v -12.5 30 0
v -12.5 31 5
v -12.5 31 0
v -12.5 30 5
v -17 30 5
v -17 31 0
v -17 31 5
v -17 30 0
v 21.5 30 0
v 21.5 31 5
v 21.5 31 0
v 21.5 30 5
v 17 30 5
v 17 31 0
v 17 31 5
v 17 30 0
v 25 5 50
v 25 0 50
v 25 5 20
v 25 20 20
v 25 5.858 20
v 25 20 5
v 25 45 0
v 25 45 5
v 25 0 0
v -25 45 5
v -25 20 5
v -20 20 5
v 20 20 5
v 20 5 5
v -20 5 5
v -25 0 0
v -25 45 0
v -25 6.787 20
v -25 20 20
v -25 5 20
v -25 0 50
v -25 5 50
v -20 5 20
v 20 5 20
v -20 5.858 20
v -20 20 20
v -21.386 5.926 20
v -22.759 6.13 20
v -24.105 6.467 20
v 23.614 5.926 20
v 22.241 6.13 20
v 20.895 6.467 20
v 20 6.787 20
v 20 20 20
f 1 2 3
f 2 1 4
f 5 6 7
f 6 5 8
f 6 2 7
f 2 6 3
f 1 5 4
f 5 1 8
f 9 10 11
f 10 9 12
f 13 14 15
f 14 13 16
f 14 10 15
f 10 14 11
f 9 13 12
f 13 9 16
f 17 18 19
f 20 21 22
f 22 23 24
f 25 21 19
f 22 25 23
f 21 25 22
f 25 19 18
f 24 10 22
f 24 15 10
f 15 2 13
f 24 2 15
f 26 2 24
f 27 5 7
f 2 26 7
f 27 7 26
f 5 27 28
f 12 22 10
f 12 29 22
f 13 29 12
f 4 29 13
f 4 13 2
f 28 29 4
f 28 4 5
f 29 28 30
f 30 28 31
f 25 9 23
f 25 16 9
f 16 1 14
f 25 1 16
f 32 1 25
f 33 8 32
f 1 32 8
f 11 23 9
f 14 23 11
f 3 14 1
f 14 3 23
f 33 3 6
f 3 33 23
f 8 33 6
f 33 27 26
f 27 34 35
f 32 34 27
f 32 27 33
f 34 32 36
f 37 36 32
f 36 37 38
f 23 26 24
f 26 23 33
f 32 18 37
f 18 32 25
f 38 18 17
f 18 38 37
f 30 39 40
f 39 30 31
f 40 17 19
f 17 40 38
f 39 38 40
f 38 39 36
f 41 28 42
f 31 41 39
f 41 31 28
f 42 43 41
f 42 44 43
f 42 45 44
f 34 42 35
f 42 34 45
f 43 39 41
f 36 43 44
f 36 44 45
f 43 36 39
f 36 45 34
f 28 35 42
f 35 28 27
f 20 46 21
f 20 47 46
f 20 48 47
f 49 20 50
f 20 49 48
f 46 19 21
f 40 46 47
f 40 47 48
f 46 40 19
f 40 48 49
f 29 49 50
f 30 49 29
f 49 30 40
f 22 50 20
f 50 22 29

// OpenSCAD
// L-shaped mounting bracket for NEMA 17 stepper motor (syringe pump)
// Print orientation: base plate on bed, vertical motor plate builds up +Z

// ---------------- Parameters ----------------
base_x0      = -25;   // base plate x start
base_x1      = 25;    // base plate x end
base_y0      = 0;     // base plate y start
base_y1      = 45;    // base plate y end
base_z       = 5;     // base plate thickness

motor_x0     = -25;   // motor plate x start
motor_x1     = 25;    // motor plate x end
motor_y      = 5;     // motor plate thickness (y end)
motor_z      = 50;    // motor plate height (z end)

boss_d       = 23;    // motor centring boss hole diameter
boss_x       = 0;     // boss hole centre x
boss_z       = 28;    // boss hole centre z

screw_d      = 3.4;   // M3 screw hole diameter
screw_n      = 4;     // number of screw holes
screw_pitch  = 31;    // square pattern side length

gusset_t     = 5;     // gusset thickness (x direction)
gusset_leg   = 20;    // right triangle legs along +Y and +Z
gusset_x0    = -25;   // left gusset x start
gusset_x1    = -20;   // left gusset x end
gusset_x2    = 20;    // right gusset x start
gusset_x3    = 25;    // right gusset x end

eps          = 0.5;   // cutter overshoot past faces

$fn = 96;

// ---------------- Model ----------------
union() {
    // Base plate with two vertical through-holes (M4)
    difference() {
        translate([base_x0, base_y0, 0])
            cube([base_x1 - base_x0, base_y1 - base_y0, base_z]);
        for (sx = [-17, 17])
            translate([sx, base_y1 - 15, -eps])
                cube([4.5, 1, base_z + 2 * eps]);
    }

    // Vertical motor plate standing on back edge of base
    difference() {
        translate([motor_x0, 0, 0])
            cube([motor_x1 - motor_x0, motor_y, motor_z]);
        // Boss hole along Y, centred at x = 0, z = 28
        translate([boss_x, -eps, boss_z])
            rotate([90, 0, 0])
                cylinder(d = boss_d, h = motor_y + 2 * eps);
        // M3 screw holes on 31 mm square pattern centred on boss hole
        for (i = [0 : screw_n - 1]) {
            a = screw_pitch / 2;
            x = a * cos(45 + i * 90);
            z = boss_z + a * sin(45 + i * 90);
            translate([x, -eps, z])
                rotate([90, 0, 0])
                    cylinder(d = screw_d, h = motor_y + 2 * eps);
        }
    }

    // Gussets flush with left and right edges
    for (sx = [gusset_x0, gusset_x2]) {
        translate([sx, 0, 0])
            difference() {
                translate([0, 0, 0])
                    cube([gusset_t, gusset_leg, gusset_leg]);
                // Round the hypotenuse (fillet)
                translate([gusset_t, gusset_leg, gusset_leg])
                    linear_extrude(gusset_t)
                        circle(d = gusset_leg * sqrt(2), $fn = 64);
            }
    }
}
